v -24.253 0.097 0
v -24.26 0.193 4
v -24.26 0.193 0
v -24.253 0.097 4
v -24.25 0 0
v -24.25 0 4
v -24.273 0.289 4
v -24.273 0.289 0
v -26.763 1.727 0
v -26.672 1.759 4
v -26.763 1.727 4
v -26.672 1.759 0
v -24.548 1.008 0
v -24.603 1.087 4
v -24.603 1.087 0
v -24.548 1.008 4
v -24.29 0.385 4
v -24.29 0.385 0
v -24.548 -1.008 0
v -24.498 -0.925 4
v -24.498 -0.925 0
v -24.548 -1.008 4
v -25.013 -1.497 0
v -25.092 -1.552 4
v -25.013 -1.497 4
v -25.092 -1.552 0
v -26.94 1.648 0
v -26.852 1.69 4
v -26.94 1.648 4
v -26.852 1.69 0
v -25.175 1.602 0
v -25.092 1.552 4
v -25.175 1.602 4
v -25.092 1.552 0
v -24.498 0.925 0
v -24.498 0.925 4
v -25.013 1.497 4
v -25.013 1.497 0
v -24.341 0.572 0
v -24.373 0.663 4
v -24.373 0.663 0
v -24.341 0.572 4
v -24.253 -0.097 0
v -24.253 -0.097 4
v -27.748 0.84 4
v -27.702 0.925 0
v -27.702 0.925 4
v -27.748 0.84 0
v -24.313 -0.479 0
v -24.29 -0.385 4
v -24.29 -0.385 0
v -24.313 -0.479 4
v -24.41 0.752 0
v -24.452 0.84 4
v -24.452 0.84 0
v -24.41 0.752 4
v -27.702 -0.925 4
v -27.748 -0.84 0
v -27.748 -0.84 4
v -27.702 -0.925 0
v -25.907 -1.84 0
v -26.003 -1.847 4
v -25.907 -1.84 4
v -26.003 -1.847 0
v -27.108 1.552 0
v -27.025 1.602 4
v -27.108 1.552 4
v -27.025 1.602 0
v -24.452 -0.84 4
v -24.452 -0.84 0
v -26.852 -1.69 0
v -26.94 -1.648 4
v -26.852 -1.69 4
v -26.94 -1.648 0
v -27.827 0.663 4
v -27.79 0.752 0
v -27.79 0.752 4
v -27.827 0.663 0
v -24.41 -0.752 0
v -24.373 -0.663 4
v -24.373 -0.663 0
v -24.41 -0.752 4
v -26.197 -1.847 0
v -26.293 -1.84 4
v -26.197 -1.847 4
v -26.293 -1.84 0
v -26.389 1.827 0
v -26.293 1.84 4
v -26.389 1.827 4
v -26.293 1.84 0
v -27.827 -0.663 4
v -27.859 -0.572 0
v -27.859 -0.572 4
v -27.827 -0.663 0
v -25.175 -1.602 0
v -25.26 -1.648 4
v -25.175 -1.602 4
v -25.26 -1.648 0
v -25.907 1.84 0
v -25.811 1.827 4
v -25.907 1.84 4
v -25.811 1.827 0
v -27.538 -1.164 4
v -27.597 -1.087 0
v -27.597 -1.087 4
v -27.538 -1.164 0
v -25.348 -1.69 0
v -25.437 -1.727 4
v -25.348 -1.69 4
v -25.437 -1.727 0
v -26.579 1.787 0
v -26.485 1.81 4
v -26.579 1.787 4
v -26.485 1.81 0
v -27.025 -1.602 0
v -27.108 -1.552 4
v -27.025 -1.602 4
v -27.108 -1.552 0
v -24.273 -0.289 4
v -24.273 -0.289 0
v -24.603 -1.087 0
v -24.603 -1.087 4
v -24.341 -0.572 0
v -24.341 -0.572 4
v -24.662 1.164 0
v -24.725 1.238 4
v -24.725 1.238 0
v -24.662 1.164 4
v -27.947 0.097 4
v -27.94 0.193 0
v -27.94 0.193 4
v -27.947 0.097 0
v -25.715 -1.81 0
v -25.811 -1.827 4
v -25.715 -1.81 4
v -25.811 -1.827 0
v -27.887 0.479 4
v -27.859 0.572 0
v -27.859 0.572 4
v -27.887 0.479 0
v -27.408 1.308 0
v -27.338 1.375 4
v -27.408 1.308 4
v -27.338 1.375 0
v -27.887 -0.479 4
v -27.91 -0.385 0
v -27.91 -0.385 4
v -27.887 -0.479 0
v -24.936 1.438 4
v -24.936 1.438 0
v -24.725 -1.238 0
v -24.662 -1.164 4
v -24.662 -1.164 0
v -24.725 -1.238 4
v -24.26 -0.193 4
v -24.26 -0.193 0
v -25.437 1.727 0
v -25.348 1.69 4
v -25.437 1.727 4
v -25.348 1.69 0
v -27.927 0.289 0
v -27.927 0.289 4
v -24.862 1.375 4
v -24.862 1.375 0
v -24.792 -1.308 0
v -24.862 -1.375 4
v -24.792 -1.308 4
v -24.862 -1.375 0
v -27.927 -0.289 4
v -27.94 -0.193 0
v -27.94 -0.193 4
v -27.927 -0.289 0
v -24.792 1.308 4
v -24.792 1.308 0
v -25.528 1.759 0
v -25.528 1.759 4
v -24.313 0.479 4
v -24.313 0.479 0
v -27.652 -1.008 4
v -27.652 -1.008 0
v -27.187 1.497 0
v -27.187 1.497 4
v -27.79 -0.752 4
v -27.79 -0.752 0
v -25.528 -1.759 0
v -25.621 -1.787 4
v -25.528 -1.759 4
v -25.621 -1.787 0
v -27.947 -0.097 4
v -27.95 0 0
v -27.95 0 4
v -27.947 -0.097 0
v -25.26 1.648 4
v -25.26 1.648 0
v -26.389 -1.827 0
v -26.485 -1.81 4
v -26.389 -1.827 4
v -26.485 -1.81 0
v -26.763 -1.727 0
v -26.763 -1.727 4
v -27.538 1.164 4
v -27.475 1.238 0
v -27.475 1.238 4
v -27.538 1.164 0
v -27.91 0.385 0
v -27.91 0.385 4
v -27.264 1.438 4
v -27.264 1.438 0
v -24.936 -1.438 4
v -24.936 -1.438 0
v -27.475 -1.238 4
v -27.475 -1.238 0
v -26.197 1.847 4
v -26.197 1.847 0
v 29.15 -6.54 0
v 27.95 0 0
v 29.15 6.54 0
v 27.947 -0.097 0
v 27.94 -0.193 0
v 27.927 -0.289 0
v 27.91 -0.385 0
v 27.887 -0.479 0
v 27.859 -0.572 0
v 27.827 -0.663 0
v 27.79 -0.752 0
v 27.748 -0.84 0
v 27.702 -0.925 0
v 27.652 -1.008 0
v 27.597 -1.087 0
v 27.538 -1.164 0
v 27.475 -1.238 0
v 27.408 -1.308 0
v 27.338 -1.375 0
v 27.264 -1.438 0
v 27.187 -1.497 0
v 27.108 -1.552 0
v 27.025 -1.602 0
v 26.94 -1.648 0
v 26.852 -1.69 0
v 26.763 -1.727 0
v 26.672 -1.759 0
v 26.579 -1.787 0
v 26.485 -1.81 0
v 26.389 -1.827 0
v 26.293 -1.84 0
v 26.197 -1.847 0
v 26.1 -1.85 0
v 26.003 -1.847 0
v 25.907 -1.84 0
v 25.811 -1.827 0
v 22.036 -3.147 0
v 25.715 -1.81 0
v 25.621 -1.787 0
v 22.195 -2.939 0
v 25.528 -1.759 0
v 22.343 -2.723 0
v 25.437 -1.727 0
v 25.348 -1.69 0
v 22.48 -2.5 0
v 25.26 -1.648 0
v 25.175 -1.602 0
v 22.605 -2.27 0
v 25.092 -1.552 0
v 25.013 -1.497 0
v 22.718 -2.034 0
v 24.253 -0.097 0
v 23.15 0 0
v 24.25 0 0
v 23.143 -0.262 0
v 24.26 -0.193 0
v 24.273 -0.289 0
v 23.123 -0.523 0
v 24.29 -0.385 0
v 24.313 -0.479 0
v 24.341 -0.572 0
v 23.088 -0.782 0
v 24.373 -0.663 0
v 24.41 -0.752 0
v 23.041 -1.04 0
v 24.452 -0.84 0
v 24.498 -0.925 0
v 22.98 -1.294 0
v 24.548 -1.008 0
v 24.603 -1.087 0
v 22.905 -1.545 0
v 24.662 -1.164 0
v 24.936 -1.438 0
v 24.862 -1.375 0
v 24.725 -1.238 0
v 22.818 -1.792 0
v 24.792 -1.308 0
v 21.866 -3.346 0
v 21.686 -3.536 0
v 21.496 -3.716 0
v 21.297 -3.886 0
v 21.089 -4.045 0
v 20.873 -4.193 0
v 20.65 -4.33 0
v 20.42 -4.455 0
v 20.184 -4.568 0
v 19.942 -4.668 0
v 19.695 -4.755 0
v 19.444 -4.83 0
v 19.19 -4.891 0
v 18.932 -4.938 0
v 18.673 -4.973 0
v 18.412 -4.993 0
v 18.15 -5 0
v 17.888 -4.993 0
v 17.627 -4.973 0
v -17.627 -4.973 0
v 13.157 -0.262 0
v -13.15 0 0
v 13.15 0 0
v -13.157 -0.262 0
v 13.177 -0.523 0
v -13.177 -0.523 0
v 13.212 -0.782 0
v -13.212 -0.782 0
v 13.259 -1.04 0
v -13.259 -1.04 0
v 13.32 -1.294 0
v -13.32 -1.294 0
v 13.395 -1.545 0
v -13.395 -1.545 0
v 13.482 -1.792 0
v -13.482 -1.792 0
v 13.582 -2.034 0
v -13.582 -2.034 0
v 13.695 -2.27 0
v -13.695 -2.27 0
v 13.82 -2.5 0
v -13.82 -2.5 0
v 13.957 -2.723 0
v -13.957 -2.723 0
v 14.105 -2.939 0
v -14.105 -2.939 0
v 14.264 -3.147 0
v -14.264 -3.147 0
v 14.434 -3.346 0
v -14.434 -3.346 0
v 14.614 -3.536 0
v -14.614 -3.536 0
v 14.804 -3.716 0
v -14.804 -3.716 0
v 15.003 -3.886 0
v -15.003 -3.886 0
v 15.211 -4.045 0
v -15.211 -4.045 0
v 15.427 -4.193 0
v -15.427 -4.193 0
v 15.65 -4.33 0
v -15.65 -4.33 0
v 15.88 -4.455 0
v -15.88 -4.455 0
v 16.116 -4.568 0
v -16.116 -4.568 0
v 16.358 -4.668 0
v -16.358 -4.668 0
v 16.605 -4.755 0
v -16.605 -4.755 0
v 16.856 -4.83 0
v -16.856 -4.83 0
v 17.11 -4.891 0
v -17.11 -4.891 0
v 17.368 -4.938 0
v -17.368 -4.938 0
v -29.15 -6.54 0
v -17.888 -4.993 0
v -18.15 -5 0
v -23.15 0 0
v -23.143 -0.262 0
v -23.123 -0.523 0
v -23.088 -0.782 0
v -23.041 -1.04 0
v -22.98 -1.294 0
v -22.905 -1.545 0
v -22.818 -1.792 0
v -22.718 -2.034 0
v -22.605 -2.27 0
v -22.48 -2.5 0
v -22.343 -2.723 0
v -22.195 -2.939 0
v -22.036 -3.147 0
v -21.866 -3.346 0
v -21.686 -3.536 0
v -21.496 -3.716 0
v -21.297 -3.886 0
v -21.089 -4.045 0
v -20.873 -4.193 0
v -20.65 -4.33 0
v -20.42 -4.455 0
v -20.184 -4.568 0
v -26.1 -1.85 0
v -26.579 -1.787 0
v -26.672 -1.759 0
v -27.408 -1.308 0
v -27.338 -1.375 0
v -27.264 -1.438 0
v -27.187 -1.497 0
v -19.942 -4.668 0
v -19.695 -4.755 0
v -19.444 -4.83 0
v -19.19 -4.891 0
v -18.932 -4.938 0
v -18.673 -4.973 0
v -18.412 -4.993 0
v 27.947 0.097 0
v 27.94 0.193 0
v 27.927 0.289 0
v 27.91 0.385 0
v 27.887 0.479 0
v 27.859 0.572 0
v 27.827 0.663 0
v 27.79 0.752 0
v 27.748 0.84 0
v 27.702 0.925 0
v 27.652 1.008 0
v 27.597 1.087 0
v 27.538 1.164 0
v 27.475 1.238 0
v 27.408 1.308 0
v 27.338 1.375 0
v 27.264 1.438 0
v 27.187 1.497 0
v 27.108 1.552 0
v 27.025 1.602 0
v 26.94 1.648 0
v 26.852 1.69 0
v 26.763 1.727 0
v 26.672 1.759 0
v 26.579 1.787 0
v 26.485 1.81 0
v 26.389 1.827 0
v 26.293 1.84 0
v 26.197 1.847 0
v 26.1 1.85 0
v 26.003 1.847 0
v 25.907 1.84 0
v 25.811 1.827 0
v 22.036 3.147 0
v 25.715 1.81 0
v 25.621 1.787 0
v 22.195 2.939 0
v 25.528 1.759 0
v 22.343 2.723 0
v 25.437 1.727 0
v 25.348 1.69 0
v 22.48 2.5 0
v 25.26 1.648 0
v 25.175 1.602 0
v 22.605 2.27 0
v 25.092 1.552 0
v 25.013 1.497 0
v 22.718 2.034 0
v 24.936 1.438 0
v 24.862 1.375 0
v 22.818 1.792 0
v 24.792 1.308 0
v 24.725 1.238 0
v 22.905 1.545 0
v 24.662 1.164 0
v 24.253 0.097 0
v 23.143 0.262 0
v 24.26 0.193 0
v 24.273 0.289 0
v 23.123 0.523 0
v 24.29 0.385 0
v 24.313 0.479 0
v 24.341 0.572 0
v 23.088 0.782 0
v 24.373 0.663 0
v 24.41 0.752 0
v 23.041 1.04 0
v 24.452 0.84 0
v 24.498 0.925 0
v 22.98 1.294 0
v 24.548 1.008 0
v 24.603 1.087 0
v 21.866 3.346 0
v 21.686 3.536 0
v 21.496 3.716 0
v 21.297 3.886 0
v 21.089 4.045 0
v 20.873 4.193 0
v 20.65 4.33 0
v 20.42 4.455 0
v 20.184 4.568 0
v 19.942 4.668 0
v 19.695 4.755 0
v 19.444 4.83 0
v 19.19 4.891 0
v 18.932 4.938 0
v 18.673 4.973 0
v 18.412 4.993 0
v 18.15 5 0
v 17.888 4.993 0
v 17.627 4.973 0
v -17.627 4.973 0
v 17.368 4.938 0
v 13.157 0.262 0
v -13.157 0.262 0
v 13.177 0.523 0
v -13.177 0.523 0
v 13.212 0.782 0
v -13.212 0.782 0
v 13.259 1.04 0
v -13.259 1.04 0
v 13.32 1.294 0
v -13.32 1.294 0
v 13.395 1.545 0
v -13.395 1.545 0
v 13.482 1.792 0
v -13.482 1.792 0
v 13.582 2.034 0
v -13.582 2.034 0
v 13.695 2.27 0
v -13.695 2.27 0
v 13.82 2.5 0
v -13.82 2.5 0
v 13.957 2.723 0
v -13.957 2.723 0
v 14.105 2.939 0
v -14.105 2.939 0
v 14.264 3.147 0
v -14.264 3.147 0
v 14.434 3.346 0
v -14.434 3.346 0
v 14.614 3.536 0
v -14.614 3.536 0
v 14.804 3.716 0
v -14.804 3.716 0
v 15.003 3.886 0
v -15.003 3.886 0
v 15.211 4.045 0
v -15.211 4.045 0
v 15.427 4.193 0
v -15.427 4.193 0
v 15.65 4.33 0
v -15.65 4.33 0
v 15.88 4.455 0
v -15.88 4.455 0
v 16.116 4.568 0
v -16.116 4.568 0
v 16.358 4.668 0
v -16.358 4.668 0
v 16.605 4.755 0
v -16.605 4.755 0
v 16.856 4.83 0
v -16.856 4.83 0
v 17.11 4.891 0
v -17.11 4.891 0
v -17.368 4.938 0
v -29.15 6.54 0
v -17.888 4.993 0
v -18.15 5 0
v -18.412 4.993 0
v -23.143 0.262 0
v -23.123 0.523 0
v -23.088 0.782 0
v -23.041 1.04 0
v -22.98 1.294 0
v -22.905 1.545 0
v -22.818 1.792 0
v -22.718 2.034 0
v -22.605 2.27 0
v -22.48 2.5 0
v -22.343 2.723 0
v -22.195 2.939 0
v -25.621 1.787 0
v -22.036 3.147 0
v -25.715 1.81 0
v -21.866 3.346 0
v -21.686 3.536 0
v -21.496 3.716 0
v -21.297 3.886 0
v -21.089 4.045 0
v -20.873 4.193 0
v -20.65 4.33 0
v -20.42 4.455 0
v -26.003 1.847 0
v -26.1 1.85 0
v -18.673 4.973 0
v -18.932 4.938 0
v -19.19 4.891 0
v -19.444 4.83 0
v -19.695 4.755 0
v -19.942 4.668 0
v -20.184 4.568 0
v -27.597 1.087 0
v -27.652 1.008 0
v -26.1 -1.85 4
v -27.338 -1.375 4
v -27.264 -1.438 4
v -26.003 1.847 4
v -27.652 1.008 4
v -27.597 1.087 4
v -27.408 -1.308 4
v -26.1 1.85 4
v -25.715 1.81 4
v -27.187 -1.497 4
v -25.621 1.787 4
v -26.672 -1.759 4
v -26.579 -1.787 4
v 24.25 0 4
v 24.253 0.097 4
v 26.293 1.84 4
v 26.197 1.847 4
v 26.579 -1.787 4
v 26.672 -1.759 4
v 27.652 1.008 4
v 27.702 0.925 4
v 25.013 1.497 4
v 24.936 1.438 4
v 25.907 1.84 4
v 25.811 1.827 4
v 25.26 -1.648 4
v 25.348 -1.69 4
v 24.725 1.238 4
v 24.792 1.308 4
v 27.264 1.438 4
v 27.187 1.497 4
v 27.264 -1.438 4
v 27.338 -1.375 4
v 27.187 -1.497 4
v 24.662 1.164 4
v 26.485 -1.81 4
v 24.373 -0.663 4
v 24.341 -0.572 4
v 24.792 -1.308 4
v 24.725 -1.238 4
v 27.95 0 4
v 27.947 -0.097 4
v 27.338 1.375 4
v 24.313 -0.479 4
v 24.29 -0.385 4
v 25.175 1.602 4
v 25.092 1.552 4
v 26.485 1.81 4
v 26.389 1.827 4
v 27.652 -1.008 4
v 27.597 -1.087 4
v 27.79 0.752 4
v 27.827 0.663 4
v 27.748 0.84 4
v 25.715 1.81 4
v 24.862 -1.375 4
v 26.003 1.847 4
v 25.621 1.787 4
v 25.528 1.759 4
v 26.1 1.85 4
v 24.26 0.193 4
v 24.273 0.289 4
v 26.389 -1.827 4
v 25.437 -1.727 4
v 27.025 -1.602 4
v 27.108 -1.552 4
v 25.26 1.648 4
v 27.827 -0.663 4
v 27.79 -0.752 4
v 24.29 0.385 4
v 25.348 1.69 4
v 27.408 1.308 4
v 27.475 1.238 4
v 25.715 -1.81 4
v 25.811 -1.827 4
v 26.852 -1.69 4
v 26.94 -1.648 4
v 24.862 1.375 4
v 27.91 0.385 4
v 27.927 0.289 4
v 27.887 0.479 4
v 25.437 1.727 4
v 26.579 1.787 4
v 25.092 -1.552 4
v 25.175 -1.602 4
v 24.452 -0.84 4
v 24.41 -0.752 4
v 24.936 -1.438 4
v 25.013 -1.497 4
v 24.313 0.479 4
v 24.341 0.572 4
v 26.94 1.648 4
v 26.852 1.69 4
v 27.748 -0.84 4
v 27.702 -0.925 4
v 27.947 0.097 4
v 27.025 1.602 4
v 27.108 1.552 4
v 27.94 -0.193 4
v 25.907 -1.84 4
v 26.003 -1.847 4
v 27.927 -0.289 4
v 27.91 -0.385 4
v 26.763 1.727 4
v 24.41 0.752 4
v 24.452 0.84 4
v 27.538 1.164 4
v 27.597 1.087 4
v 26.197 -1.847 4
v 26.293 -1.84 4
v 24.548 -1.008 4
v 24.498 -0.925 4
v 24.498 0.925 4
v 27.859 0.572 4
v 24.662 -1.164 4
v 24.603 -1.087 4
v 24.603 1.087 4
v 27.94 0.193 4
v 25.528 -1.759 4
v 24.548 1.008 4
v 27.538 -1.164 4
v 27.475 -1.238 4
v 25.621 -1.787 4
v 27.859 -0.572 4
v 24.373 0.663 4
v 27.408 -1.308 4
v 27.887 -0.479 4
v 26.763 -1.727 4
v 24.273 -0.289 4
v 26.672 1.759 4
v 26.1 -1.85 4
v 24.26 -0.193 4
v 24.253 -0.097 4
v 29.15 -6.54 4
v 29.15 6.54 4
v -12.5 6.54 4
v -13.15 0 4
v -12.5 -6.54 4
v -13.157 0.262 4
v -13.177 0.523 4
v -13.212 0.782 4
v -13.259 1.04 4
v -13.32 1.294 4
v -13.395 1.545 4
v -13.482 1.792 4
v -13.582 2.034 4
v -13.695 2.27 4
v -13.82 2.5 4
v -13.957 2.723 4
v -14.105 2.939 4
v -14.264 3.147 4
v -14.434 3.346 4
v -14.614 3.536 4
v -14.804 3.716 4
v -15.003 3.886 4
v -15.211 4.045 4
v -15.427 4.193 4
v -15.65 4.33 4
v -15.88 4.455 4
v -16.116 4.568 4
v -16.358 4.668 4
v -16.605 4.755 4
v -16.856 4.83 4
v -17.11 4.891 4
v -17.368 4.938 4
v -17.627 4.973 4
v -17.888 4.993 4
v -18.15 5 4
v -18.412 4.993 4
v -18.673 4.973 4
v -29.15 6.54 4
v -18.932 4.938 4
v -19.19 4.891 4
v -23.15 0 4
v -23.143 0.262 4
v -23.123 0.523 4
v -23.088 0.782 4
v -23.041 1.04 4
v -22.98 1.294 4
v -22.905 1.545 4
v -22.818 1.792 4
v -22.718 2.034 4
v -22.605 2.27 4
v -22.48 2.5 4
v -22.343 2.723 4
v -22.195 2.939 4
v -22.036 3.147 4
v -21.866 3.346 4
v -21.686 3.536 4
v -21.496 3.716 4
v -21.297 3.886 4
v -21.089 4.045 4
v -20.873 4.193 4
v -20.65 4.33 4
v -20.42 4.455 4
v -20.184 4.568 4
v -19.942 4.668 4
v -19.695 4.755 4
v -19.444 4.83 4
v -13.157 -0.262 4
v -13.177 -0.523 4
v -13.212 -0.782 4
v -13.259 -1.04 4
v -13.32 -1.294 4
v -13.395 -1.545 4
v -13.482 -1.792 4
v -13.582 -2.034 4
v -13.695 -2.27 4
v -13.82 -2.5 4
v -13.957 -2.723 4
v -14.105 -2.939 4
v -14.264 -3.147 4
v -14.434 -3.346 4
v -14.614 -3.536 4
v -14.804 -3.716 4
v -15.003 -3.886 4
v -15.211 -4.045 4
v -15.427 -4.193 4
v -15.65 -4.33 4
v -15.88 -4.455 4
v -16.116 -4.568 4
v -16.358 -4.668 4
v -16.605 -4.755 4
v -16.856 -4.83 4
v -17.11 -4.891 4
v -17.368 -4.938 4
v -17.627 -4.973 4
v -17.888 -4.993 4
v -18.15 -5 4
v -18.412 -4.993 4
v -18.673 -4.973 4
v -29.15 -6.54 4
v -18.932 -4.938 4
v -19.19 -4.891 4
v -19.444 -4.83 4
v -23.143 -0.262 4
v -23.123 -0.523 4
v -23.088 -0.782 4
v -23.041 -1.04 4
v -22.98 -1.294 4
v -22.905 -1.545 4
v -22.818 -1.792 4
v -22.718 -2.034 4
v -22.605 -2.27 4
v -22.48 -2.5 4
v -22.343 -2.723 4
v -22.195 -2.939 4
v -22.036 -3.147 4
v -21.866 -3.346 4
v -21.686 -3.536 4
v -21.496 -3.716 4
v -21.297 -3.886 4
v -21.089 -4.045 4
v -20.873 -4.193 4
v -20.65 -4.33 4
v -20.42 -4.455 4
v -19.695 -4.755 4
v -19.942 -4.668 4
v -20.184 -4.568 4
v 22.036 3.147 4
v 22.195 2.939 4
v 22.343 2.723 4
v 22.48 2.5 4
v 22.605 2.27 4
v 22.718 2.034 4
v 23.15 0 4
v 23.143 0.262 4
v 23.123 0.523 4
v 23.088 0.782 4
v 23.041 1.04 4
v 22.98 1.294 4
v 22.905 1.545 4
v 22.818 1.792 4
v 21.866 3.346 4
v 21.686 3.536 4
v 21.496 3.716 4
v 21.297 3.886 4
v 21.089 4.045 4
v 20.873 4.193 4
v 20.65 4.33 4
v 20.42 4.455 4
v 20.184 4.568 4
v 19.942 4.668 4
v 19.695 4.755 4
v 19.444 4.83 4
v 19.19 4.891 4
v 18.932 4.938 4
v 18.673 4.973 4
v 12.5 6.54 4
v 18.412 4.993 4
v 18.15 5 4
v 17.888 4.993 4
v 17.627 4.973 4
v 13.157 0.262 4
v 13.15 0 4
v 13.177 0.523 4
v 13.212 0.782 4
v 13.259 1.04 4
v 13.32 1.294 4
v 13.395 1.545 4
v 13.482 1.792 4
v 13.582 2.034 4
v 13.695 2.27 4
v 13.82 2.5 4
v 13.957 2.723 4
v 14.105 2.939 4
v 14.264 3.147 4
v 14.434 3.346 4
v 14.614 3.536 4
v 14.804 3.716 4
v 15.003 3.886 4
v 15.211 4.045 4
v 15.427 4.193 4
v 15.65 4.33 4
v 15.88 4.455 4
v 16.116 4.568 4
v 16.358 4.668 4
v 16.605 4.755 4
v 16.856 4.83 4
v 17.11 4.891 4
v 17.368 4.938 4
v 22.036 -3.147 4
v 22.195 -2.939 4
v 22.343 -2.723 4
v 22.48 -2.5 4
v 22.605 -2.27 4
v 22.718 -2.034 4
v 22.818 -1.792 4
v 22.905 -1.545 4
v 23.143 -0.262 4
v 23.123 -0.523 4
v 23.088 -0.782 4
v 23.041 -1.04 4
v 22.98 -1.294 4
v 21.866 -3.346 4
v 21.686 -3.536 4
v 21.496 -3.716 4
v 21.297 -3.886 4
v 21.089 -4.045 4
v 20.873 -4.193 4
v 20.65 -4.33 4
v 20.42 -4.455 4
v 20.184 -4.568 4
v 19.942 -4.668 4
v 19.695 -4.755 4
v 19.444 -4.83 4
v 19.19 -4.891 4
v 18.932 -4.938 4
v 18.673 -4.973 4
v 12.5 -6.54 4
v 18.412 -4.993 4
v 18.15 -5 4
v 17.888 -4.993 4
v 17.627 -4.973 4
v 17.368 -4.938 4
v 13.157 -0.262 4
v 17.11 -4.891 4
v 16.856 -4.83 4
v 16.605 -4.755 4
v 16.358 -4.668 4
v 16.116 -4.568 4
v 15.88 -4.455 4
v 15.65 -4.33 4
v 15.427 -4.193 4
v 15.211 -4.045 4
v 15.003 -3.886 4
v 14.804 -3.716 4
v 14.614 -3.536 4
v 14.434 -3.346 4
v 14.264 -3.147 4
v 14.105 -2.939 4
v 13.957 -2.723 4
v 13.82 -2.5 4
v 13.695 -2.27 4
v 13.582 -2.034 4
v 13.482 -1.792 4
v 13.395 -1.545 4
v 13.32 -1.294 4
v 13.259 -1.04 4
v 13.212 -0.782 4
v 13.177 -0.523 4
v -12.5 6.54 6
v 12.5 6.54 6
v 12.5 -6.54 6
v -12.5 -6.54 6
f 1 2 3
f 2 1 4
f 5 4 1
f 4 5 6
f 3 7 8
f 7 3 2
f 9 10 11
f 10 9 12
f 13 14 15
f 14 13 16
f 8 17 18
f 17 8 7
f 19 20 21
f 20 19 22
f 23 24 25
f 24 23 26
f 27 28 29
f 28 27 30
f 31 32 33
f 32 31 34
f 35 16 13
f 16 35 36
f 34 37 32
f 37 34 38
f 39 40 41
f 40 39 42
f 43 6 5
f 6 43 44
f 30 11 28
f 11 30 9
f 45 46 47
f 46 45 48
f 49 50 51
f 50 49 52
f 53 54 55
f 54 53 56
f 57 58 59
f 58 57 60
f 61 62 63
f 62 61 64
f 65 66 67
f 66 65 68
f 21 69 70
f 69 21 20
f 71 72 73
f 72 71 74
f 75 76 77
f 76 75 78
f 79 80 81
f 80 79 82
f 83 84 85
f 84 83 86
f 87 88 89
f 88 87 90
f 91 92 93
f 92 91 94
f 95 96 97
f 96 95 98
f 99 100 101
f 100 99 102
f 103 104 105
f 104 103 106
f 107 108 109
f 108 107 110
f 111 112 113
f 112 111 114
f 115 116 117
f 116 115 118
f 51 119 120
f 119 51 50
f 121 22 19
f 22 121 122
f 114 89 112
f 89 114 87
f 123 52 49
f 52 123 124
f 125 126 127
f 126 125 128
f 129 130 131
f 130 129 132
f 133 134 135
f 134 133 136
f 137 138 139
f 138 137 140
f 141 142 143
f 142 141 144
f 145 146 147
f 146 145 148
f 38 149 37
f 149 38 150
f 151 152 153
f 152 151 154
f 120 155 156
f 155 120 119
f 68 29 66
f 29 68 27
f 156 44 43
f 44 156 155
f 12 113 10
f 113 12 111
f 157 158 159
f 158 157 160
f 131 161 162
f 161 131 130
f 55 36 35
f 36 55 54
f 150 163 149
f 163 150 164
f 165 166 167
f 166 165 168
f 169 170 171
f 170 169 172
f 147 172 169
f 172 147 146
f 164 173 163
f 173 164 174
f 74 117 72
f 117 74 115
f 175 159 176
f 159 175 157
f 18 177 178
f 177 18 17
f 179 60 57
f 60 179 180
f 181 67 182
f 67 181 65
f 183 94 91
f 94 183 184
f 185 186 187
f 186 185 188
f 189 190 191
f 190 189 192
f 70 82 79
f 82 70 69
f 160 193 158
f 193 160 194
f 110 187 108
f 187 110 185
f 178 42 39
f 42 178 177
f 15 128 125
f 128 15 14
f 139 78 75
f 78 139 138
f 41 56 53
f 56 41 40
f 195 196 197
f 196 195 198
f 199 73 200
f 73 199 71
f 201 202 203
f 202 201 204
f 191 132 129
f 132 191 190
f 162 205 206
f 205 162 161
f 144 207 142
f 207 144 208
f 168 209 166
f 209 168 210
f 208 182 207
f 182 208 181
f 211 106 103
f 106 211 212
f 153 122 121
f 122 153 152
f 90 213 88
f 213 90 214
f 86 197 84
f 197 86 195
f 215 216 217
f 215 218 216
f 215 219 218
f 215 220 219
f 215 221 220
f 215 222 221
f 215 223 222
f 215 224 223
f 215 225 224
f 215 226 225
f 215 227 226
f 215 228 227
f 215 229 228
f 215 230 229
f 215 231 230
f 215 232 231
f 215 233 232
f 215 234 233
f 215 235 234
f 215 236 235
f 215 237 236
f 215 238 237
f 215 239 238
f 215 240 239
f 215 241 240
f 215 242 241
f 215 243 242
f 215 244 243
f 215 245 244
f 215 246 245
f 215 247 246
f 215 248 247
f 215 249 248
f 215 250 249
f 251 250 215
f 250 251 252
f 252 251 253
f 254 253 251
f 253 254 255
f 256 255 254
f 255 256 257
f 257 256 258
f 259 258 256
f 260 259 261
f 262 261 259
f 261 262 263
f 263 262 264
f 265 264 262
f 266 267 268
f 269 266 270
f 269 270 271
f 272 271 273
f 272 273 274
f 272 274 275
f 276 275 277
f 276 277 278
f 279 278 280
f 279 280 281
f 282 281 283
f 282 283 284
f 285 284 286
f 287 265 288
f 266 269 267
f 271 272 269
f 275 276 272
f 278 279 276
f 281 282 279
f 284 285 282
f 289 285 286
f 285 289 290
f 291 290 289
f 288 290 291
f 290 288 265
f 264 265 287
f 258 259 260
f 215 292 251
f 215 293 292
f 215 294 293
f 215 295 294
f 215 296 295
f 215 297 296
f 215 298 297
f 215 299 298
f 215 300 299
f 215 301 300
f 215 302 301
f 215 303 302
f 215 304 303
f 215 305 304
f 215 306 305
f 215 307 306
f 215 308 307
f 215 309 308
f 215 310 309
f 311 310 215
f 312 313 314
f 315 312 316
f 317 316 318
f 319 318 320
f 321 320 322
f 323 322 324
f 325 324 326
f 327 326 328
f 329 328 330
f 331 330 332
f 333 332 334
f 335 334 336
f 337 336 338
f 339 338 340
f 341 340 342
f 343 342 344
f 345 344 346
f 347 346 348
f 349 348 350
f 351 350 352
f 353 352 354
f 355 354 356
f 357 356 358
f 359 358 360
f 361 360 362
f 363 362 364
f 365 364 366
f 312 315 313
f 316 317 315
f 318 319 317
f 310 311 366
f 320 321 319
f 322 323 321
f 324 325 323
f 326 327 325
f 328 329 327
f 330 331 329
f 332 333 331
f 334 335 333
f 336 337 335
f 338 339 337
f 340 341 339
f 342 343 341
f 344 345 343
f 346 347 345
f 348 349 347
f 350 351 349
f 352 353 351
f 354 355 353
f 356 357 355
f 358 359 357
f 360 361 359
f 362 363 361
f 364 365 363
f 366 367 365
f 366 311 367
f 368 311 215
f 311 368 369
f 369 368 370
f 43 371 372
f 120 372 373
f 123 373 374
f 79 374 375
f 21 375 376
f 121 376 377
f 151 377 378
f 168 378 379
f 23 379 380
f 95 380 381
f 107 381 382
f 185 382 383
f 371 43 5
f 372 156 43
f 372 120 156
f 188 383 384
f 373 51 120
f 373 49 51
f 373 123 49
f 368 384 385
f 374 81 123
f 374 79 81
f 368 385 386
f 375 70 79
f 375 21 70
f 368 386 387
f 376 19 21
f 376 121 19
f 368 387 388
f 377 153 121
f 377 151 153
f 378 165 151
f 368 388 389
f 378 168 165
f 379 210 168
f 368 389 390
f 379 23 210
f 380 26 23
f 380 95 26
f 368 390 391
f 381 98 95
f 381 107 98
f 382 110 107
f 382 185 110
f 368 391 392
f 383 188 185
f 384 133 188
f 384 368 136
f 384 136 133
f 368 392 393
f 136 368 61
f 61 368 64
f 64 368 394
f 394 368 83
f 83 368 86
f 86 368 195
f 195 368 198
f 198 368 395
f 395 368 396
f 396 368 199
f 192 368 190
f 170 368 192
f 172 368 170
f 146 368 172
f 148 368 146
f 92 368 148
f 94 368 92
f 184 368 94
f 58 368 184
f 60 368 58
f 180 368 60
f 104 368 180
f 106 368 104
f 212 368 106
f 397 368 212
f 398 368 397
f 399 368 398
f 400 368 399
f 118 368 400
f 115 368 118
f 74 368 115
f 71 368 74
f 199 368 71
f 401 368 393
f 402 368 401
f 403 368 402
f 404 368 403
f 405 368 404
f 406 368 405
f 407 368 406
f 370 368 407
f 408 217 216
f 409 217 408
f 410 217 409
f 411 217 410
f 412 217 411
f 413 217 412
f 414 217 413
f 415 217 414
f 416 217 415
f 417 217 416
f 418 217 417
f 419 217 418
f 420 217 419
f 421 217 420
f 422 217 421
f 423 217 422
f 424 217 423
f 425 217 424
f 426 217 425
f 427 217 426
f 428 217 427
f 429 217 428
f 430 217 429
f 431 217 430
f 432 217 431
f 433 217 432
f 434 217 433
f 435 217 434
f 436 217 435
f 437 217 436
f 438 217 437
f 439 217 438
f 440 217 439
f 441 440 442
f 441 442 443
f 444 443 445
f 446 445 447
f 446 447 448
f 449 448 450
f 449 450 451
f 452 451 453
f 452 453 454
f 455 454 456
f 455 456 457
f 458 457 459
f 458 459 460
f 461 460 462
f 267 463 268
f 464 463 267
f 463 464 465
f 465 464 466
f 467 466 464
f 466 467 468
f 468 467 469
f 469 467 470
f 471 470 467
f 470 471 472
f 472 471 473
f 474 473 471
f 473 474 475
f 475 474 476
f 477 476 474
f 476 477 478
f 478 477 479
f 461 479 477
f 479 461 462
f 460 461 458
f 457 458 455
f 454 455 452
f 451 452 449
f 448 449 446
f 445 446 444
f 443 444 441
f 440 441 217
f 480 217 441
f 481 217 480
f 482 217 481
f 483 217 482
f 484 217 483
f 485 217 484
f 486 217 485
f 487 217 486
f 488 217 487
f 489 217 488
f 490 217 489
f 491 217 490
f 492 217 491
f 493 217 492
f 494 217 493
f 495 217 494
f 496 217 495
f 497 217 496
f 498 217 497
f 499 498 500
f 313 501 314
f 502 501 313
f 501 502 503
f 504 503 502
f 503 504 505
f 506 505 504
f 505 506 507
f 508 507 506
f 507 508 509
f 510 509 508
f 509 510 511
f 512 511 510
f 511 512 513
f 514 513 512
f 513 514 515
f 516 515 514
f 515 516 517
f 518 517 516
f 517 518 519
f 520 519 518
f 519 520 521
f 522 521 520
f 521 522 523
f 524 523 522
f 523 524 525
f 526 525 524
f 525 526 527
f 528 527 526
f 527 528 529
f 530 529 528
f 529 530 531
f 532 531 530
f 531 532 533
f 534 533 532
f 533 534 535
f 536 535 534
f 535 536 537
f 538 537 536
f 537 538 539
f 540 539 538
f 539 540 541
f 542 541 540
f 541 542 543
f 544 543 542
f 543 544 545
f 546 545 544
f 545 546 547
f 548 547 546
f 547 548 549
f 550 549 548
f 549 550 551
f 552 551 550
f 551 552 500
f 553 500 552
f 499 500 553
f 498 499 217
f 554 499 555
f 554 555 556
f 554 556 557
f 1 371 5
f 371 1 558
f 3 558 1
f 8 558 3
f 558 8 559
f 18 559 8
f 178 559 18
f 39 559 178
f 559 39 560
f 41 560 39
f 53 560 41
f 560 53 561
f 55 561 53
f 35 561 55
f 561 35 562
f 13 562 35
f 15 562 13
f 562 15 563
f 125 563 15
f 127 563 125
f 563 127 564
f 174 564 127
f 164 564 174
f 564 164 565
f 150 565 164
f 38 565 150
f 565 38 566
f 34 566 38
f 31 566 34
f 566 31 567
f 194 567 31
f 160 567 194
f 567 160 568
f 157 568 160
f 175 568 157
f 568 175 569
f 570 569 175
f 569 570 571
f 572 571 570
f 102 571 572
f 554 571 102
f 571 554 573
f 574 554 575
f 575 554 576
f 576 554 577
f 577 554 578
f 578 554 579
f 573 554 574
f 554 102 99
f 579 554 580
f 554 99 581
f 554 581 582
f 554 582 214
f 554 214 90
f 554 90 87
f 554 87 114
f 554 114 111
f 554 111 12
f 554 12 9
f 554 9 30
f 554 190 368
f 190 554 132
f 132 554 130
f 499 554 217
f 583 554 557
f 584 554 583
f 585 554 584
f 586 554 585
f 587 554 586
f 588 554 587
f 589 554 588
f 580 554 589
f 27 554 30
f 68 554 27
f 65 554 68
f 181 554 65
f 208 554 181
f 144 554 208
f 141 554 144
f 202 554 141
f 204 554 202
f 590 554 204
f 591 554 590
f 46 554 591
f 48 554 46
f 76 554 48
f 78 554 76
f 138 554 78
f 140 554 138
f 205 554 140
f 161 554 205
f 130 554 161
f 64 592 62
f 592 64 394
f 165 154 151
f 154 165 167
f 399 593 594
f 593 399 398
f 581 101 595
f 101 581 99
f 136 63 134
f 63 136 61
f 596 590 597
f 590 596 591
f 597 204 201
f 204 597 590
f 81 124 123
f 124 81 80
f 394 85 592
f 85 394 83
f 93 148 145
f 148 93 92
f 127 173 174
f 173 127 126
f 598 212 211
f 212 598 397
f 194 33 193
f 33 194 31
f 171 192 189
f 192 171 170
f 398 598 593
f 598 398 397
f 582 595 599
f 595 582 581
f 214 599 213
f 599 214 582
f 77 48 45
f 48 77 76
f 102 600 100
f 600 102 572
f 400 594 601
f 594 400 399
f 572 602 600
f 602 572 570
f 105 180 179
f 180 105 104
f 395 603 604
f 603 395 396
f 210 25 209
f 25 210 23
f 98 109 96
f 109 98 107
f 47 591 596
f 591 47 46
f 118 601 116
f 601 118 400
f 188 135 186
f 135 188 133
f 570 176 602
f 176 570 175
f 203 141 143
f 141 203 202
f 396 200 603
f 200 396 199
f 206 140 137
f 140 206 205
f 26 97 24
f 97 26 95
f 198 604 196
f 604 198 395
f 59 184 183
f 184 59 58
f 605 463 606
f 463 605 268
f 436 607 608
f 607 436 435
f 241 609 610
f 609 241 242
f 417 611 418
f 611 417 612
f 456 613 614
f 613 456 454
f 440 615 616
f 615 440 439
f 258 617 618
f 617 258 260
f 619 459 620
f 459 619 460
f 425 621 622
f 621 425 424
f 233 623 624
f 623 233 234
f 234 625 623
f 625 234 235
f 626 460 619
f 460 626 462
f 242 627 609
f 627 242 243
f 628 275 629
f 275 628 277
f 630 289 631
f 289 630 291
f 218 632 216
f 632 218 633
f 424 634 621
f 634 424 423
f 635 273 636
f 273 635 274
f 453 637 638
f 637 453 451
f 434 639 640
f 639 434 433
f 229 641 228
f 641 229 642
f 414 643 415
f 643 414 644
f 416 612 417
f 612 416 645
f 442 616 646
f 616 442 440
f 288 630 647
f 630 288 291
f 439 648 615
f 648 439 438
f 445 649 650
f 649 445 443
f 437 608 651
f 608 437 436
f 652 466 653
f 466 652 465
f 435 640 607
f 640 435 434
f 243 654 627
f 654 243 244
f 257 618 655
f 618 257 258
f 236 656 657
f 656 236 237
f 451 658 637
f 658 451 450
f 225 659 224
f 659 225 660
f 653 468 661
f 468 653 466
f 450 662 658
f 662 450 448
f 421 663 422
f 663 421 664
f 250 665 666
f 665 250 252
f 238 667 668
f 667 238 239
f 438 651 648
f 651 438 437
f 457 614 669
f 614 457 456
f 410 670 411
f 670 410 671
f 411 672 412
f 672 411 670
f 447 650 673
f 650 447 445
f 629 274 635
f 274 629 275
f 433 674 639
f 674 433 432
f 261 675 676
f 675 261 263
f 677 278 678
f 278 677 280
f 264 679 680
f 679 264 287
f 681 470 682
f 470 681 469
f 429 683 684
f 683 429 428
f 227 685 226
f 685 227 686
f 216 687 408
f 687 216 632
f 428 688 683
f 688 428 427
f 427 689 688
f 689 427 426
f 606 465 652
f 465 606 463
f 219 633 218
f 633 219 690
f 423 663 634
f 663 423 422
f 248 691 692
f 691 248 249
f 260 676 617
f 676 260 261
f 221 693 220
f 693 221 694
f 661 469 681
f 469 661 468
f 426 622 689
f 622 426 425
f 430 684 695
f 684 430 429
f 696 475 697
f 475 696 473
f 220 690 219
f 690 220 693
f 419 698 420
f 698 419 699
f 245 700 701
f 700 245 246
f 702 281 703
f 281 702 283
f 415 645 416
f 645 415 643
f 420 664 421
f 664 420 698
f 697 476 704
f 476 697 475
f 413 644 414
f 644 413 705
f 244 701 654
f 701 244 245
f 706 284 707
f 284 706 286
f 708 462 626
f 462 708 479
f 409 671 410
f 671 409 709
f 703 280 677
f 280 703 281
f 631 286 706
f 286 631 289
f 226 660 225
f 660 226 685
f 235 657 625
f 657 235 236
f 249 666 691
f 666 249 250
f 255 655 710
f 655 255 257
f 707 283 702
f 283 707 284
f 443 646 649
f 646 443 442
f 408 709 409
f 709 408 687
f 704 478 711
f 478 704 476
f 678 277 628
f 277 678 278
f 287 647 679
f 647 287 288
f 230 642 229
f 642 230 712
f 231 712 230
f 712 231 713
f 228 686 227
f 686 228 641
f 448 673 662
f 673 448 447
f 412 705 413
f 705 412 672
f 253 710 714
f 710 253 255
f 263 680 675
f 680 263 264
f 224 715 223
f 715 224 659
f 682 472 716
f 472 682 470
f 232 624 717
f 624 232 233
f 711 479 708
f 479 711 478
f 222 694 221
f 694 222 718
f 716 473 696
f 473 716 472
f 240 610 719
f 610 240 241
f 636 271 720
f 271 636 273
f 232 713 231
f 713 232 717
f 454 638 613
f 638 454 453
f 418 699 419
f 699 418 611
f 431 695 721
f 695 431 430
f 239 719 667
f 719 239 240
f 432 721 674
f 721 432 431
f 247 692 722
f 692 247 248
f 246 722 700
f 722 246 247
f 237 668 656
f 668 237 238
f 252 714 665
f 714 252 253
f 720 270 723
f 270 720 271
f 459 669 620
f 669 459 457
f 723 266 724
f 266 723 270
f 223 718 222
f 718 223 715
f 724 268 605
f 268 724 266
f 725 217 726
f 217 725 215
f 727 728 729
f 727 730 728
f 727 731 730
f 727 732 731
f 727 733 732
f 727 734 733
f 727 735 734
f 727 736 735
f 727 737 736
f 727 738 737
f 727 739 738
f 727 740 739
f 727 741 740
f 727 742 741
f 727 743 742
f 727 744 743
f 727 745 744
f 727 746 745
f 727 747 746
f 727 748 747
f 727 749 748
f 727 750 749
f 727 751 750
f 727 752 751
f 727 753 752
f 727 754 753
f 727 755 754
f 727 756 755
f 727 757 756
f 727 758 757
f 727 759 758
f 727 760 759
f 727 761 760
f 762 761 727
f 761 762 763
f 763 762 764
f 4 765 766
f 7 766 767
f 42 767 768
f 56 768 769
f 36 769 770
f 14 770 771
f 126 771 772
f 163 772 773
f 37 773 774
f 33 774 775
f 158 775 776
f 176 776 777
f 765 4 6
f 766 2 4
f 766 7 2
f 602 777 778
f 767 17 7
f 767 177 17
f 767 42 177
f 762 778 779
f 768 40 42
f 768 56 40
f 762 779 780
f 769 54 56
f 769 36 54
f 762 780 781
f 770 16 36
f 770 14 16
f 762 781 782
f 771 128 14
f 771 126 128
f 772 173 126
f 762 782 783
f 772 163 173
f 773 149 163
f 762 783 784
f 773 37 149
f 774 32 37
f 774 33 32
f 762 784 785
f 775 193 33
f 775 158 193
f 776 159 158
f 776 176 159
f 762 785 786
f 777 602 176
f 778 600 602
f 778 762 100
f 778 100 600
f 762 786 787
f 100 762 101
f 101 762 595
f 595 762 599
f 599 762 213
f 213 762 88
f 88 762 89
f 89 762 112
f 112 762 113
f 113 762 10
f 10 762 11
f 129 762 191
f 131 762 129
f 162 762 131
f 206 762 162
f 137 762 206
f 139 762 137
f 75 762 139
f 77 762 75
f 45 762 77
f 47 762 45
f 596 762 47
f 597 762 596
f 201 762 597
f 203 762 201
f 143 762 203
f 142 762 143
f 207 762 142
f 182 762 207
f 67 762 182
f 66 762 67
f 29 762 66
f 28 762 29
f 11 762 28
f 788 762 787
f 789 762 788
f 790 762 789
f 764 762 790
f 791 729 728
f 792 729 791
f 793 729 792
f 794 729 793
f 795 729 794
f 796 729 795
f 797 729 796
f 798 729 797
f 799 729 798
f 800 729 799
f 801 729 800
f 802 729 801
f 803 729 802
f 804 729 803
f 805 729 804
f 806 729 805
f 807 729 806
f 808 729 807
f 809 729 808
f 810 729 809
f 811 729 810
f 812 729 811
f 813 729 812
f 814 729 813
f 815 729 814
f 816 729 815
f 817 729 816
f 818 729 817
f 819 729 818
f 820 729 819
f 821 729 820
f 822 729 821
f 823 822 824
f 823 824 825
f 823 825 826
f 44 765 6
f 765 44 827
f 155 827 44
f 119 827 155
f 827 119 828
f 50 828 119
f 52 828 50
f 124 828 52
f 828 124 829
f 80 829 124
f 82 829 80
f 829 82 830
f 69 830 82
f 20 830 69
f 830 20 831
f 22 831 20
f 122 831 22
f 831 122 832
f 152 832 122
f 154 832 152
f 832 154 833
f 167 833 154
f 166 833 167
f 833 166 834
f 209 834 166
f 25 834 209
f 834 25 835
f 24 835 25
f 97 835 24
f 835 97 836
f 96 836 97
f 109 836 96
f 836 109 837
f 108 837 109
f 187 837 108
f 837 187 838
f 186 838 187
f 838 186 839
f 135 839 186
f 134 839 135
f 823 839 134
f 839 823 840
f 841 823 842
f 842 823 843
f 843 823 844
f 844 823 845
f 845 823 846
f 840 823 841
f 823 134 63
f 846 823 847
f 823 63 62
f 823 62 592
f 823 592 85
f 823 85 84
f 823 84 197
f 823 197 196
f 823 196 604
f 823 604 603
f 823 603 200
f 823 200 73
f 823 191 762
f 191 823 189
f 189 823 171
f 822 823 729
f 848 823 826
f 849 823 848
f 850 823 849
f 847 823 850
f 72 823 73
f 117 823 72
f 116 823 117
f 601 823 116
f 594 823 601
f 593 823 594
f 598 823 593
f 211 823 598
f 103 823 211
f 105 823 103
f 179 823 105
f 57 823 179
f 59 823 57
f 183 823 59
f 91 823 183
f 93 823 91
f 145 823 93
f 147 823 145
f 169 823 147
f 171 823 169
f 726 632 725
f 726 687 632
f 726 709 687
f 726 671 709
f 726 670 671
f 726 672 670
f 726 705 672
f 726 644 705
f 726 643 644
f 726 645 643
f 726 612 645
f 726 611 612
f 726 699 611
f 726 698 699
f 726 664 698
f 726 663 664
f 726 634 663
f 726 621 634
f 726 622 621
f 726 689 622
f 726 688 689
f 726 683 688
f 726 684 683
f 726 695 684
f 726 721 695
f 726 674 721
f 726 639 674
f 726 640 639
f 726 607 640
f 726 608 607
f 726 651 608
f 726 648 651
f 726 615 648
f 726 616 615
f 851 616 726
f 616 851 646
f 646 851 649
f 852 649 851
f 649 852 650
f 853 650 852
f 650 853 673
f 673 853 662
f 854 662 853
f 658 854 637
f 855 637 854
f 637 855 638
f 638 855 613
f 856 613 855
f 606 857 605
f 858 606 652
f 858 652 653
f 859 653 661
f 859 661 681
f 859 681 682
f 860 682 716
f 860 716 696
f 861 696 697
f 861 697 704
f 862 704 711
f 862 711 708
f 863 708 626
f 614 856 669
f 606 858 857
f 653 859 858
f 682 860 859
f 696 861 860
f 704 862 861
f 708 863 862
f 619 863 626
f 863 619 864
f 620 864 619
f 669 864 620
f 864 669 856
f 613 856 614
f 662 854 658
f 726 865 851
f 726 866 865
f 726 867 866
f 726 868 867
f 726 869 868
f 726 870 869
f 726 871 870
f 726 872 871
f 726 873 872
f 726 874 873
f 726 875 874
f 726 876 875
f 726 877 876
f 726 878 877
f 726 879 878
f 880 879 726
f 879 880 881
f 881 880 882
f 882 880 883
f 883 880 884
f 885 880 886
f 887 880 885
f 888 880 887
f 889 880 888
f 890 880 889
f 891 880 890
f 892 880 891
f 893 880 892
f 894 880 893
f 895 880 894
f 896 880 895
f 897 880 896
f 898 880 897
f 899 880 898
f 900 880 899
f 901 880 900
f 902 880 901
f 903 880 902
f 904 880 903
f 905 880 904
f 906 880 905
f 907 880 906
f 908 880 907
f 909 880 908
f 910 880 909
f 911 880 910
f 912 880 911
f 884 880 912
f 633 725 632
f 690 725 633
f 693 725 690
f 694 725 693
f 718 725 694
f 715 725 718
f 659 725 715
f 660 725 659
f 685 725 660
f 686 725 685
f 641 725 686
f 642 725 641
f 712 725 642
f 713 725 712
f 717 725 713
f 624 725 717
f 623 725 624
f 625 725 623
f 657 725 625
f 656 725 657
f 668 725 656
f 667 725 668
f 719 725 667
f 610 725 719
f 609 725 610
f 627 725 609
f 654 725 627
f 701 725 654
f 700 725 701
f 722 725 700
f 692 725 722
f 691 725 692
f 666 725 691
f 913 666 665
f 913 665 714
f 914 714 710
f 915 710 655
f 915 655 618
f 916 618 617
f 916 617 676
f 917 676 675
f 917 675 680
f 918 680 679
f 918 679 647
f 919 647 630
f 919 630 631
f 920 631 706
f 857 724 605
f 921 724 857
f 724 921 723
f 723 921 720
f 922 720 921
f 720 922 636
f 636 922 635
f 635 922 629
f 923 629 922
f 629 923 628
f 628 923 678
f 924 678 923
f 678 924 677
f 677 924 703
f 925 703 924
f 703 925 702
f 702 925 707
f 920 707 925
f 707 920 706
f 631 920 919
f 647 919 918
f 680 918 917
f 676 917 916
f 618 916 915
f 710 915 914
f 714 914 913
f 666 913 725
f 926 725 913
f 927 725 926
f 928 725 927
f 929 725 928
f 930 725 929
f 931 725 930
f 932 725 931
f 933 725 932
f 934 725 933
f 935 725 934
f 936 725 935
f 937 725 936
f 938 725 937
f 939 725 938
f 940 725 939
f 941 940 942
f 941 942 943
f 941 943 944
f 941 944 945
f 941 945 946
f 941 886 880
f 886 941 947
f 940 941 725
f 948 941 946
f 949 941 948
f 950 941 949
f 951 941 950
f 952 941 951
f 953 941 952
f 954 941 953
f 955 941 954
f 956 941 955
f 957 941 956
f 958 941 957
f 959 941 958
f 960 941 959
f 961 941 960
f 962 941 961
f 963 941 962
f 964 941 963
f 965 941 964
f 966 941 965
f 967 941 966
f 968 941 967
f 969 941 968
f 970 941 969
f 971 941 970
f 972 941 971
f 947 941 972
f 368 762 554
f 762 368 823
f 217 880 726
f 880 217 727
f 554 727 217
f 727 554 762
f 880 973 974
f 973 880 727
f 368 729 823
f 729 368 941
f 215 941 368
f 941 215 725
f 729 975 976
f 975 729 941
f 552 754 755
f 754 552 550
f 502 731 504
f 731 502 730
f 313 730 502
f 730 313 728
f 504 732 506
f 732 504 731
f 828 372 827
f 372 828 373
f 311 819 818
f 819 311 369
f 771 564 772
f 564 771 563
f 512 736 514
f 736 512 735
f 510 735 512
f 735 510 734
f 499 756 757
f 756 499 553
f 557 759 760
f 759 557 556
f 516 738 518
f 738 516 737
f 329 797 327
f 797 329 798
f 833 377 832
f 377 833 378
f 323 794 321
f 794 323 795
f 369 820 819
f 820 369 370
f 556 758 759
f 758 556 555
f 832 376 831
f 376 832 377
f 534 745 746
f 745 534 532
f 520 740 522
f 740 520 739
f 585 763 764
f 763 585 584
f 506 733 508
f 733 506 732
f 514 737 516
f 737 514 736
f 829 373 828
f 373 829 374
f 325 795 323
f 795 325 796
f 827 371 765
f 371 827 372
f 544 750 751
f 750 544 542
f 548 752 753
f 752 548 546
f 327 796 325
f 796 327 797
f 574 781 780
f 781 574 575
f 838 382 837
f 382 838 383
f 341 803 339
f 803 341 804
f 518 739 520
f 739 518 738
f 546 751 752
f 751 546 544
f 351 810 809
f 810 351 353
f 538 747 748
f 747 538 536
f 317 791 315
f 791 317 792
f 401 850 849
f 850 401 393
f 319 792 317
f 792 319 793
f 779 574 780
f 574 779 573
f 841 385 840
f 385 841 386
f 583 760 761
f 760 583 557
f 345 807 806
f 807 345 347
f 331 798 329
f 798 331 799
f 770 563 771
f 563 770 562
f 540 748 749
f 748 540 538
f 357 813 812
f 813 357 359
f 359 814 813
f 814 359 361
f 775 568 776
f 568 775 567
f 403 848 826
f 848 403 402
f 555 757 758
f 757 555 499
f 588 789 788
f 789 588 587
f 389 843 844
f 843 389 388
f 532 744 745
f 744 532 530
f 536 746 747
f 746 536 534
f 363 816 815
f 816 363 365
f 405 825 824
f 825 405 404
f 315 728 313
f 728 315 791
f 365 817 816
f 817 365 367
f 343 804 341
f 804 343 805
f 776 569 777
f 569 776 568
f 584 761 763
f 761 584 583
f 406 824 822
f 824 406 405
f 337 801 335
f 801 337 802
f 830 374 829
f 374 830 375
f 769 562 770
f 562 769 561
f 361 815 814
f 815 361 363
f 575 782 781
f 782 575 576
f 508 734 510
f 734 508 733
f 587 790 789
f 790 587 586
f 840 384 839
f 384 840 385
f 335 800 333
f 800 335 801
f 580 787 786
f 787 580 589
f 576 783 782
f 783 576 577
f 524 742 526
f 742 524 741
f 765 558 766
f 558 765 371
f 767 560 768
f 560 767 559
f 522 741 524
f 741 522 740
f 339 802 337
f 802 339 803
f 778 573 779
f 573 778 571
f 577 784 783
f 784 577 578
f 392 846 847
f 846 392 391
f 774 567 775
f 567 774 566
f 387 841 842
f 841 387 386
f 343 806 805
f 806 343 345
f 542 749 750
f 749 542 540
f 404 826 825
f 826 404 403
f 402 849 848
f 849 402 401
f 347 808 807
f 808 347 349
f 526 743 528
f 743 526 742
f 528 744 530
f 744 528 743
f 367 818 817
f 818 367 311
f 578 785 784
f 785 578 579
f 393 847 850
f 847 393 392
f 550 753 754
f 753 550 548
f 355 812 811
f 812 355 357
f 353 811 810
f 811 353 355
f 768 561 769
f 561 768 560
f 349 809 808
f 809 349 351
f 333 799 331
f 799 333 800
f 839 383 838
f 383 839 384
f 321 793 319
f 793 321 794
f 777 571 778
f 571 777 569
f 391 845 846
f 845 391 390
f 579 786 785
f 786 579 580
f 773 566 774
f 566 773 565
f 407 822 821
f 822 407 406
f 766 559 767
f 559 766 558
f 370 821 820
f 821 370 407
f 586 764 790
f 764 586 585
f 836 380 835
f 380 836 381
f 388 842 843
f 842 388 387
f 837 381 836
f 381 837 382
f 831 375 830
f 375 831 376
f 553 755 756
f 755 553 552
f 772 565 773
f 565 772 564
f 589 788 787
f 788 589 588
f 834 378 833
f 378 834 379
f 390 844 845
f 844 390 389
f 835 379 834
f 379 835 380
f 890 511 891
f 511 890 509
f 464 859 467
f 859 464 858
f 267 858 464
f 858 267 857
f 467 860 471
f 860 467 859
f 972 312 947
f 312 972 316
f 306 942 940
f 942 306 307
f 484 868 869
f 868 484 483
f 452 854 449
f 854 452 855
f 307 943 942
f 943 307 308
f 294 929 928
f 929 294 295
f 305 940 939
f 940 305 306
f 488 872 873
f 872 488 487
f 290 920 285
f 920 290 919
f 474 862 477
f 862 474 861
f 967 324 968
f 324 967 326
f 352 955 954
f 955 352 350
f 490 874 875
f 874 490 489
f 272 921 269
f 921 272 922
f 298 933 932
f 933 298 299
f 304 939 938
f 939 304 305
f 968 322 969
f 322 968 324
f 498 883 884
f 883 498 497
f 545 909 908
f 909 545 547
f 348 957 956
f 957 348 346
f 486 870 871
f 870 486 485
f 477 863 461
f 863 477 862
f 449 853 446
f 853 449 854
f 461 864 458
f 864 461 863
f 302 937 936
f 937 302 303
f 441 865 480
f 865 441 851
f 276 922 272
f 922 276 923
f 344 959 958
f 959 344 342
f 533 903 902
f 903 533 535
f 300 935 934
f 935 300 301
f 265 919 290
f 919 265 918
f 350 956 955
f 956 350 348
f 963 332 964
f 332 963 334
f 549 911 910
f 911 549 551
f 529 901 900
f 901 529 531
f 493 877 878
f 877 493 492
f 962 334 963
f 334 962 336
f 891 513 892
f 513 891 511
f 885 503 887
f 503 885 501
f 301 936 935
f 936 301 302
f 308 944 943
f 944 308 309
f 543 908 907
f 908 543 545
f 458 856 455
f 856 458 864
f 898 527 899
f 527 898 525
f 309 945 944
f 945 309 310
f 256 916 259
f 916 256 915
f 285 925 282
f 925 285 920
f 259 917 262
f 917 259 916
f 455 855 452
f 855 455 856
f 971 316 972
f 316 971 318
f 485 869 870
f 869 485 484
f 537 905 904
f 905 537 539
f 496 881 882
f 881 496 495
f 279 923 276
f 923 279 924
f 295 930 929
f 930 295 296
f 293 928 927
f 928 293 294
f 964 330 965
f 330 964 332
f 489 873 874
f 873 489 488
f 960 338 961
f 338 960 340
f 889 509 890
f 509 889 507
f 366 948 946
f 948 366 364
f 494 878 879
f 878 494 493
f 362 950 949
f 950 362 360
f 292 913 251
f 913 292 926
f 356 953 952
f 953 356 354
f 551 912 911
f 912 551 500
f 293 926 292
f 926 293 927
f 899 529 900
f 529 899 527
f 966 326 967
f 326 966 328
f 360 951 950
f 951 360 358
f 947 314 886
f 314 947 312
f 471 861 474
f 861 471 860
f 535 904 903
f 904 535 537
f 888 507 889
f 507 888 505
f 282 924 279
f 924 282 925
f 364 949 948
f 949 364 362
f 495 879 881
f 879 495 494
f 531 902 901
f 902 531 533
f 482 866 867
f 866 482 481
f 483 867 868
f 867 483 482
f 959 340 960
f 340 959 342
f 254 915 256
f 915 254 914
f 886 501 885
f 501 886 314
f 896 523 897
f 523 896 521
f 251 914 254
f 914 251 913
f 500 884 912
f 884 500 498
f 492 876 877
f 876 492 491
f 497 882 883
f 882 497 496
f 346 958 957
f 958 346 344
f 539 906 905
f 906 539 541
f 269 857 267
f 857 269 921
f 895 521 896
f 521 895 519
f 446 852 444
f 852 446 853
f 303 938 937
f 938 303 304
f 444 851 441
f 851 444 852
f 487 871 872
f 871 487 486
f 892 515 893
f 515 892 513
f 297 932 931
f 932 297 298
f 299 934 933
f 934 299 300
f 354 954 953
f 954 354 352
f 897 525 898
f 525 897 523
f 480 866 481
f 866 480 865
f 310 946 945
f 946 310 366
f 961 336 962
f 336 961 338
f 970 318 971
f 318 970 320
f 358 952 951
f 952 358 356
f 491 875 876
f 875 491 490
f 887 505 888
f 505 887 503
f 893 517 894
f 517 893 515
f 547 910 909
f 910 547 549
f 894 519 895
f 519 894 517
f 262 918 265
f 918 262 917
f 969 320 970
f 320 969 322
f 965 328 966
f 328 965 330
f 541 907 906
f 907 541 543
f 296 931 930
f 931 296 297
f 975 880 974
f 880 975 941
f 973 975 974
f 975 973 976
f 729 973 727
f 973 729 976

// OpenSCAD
// Real Lonely T-Rex Game: Jump Motor Mount
// Copyright (C) 2017, Uri Shaked and Ariella Eliassaf

$fn=120;

module copy_mirror(vec=[0,1,0]) { 
    children(); 
    mirror(vec) children(); 
}

pole_radius = 8/2;
bearing_radius = 22.16/2;
bearing_distance = 36.3;
width = bearing_radius + 2;

    
translate([-25/2, -width/2,0])
cube([25, width, 6]);

difference() {
    translate([-(bearing_distance+22)/2, -width/2,0])
    cube([bearing_distance+22, width, 4]);
    
    copy_mirror([1,0,0])
    translate([-52.2/2,0,0])
    cylinder(r=3.7/2,h=5);

    translate([-bearing_distance/2,0,0])
    cylinder(r=pole_radius+1, h=5);

    translate([bearing_distance/2,0,0])
    cylinder(r=pole_radius+1, h=5);
}
